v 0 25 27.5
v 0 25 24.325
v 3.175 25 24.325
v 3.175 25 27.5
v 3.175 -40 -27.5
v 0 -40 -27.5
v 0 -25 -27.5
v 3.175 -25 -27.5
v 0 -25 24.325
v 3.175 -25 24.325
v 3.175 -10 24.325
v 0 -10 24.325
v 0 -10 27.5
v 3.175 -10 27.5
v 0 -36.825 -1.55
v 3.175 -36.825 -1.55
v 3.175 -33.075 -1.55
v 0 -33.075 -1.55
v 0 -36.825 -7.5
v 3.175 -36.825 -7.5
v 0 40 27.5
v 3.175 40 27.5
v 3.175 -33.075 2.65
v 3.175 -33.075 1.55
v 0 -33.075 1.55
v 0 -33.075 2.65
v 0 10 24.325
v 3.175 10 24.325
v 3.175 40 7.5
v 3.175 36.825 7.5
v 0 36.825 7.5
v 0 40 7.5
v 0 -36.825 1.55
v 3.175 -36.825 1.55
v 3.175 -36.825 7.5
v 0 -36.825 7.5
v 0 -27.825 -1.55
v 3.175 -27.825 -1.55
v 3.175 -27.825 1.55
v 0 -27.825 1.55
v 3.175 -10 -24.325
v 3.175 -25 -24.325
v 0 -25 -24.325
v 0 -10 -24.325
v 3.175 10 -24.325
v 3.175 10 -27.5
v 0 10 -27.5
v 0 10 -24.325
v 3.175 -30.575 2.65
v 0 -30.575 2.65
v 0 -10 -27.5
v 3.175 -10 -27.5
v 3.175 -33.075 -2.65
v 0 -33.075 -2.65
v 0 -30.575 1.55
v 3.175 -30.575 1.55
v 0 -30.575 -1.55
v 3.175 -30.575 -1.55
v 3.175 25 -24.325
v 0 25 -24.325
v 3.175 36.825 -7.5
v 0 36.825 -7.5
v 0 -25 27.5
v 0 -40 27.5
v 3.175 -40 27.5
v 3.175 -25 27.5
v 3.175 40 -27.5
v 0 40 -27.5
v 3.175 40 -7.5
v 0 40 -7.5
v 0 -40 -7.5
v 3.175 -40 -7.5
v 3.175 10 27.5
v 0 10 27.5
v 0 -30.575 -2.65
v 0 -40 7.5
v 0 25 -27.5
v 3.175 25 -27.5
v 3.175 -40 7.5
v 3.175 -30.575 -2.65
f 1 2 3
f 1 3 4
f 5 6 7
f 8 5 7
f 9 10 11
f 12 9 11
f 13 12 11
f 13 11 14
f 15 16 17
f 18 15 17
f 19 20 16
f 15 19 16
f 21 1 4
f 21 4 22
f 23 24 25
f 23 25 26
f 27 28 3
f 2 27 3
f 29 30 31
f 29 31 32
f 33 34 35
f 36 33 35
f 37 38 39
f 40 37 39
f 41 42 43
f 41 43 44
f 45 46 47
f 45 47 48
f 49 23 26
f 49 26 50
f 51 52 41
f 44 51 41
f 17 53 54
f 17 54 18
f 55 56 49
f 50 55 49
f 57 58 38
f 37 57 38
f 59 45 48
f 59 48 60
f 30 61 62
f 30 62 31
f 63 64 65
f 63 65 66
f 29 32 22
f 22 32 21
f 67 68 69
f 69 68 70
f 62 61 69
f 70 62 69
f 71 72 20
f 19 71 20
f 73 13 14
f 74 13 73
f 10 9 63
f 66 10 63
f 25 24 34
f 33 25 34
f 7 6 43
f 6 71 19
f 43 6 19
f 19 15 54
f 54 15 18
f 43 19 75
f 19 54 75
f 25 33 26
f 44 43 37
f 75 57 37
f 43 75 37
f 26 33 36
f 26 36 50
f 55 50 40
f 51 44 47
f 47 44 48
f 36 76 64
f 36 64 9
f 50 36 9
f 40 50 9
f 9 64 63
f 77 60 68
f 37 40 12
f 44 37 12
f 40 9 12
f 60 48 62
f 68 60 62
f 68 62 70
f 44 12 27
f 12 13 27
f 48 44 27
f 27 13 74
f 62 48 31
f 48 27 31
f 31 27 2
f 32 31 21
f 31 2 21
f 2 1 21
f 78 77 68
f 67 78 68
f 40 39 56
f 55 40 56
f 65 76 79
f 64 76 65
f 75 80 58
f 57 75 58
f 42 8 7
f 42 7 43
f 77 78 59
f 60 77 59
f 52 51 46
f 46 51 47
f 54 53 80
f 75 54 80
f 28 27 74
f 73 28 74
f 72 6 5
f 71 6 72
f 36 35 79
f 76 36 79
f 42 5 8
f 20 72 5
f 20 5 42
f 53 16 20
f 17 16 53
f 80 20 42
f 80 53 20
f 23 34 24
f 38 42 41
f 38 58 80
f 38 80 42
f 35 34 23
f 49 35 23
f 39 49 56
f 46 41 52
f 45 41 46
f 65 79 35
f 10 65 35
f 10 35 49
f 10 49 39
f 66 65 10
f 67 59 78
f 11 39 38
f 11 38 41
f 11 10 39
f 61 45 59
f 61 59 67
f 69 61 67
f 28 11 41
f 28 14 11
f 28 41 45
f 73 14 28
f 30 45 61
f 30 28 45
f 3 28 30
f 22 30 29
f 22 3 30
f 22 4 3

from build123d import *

# Parameters (mm, degrees)
F1_W     = 80
F1_H     = 55
F2_DEPTH = 3.175
F3_W     = 3.175
F3_H     = 15
F3_W_2   = 15
F3_H_2   = 3.175
F3_W_3   = 3.75
F3_H_3   = 3.1
F3_W_4   = 2.5
F3_H_4   = 1.1
F3_W_5   = 2.75
F4_DEPTH = 3.176


with BuildPart() as f2:
    # F1 (on Right) → F2 (new body)
    with BuildSketch(Plane.YZ):
        Rectangle(F1_W, F1_H)
    extrude(amount=F2_DEPTH)

    # F3 (on face) → F4 (cut, through all)
    with BuildSketch(Plane.YZ.offset(3.175)):
        with Locations((38.4125, 0)):
            Rectangle(F3_W, F3_H)
        with Locations((-17.5, -25.9125)):
            Rectangle(F3_W_2, F3_H_2)
        with Locations((17.5, -25.9125)):
            Rectangle(F3_W_2, F3_H_2)
        with Locations((-17.5, 25.9125)):
            Rectangle(F3_W_2, F3_H_2)
        with Locations((17.5, 25.9125)):
            Rectangle(F3_W_2, F3_H_2)
        with Locations((-34.95, 0)):
            Rectangle(F3_W_3, F3_H_3)
        Polygon((-36.825, -7.5), (-36.825, -1.55), (-36.825, 1.55), (-36.825, 7.5), (-40, 7.5), (-40, -7.5), align=None)
        with Locations((-31.825, 0)):
            Rectangle(F3_W_4, F3_H_3)
        with Locations((-31.825, -2.1)):
            Rectangle(F3_W_4, F3_H_4)
        with Locations((-29.2, 0)):
            Rectangle(F3_W_5, F3_H_3)
        with Locations((-31.825, 2.1)):
            Rectangle(F3_W_4, F3_H_4)
    extrude(amount=-F4_DEPTH, mode=Mode.SUBTRACT)


solid = f2.part
